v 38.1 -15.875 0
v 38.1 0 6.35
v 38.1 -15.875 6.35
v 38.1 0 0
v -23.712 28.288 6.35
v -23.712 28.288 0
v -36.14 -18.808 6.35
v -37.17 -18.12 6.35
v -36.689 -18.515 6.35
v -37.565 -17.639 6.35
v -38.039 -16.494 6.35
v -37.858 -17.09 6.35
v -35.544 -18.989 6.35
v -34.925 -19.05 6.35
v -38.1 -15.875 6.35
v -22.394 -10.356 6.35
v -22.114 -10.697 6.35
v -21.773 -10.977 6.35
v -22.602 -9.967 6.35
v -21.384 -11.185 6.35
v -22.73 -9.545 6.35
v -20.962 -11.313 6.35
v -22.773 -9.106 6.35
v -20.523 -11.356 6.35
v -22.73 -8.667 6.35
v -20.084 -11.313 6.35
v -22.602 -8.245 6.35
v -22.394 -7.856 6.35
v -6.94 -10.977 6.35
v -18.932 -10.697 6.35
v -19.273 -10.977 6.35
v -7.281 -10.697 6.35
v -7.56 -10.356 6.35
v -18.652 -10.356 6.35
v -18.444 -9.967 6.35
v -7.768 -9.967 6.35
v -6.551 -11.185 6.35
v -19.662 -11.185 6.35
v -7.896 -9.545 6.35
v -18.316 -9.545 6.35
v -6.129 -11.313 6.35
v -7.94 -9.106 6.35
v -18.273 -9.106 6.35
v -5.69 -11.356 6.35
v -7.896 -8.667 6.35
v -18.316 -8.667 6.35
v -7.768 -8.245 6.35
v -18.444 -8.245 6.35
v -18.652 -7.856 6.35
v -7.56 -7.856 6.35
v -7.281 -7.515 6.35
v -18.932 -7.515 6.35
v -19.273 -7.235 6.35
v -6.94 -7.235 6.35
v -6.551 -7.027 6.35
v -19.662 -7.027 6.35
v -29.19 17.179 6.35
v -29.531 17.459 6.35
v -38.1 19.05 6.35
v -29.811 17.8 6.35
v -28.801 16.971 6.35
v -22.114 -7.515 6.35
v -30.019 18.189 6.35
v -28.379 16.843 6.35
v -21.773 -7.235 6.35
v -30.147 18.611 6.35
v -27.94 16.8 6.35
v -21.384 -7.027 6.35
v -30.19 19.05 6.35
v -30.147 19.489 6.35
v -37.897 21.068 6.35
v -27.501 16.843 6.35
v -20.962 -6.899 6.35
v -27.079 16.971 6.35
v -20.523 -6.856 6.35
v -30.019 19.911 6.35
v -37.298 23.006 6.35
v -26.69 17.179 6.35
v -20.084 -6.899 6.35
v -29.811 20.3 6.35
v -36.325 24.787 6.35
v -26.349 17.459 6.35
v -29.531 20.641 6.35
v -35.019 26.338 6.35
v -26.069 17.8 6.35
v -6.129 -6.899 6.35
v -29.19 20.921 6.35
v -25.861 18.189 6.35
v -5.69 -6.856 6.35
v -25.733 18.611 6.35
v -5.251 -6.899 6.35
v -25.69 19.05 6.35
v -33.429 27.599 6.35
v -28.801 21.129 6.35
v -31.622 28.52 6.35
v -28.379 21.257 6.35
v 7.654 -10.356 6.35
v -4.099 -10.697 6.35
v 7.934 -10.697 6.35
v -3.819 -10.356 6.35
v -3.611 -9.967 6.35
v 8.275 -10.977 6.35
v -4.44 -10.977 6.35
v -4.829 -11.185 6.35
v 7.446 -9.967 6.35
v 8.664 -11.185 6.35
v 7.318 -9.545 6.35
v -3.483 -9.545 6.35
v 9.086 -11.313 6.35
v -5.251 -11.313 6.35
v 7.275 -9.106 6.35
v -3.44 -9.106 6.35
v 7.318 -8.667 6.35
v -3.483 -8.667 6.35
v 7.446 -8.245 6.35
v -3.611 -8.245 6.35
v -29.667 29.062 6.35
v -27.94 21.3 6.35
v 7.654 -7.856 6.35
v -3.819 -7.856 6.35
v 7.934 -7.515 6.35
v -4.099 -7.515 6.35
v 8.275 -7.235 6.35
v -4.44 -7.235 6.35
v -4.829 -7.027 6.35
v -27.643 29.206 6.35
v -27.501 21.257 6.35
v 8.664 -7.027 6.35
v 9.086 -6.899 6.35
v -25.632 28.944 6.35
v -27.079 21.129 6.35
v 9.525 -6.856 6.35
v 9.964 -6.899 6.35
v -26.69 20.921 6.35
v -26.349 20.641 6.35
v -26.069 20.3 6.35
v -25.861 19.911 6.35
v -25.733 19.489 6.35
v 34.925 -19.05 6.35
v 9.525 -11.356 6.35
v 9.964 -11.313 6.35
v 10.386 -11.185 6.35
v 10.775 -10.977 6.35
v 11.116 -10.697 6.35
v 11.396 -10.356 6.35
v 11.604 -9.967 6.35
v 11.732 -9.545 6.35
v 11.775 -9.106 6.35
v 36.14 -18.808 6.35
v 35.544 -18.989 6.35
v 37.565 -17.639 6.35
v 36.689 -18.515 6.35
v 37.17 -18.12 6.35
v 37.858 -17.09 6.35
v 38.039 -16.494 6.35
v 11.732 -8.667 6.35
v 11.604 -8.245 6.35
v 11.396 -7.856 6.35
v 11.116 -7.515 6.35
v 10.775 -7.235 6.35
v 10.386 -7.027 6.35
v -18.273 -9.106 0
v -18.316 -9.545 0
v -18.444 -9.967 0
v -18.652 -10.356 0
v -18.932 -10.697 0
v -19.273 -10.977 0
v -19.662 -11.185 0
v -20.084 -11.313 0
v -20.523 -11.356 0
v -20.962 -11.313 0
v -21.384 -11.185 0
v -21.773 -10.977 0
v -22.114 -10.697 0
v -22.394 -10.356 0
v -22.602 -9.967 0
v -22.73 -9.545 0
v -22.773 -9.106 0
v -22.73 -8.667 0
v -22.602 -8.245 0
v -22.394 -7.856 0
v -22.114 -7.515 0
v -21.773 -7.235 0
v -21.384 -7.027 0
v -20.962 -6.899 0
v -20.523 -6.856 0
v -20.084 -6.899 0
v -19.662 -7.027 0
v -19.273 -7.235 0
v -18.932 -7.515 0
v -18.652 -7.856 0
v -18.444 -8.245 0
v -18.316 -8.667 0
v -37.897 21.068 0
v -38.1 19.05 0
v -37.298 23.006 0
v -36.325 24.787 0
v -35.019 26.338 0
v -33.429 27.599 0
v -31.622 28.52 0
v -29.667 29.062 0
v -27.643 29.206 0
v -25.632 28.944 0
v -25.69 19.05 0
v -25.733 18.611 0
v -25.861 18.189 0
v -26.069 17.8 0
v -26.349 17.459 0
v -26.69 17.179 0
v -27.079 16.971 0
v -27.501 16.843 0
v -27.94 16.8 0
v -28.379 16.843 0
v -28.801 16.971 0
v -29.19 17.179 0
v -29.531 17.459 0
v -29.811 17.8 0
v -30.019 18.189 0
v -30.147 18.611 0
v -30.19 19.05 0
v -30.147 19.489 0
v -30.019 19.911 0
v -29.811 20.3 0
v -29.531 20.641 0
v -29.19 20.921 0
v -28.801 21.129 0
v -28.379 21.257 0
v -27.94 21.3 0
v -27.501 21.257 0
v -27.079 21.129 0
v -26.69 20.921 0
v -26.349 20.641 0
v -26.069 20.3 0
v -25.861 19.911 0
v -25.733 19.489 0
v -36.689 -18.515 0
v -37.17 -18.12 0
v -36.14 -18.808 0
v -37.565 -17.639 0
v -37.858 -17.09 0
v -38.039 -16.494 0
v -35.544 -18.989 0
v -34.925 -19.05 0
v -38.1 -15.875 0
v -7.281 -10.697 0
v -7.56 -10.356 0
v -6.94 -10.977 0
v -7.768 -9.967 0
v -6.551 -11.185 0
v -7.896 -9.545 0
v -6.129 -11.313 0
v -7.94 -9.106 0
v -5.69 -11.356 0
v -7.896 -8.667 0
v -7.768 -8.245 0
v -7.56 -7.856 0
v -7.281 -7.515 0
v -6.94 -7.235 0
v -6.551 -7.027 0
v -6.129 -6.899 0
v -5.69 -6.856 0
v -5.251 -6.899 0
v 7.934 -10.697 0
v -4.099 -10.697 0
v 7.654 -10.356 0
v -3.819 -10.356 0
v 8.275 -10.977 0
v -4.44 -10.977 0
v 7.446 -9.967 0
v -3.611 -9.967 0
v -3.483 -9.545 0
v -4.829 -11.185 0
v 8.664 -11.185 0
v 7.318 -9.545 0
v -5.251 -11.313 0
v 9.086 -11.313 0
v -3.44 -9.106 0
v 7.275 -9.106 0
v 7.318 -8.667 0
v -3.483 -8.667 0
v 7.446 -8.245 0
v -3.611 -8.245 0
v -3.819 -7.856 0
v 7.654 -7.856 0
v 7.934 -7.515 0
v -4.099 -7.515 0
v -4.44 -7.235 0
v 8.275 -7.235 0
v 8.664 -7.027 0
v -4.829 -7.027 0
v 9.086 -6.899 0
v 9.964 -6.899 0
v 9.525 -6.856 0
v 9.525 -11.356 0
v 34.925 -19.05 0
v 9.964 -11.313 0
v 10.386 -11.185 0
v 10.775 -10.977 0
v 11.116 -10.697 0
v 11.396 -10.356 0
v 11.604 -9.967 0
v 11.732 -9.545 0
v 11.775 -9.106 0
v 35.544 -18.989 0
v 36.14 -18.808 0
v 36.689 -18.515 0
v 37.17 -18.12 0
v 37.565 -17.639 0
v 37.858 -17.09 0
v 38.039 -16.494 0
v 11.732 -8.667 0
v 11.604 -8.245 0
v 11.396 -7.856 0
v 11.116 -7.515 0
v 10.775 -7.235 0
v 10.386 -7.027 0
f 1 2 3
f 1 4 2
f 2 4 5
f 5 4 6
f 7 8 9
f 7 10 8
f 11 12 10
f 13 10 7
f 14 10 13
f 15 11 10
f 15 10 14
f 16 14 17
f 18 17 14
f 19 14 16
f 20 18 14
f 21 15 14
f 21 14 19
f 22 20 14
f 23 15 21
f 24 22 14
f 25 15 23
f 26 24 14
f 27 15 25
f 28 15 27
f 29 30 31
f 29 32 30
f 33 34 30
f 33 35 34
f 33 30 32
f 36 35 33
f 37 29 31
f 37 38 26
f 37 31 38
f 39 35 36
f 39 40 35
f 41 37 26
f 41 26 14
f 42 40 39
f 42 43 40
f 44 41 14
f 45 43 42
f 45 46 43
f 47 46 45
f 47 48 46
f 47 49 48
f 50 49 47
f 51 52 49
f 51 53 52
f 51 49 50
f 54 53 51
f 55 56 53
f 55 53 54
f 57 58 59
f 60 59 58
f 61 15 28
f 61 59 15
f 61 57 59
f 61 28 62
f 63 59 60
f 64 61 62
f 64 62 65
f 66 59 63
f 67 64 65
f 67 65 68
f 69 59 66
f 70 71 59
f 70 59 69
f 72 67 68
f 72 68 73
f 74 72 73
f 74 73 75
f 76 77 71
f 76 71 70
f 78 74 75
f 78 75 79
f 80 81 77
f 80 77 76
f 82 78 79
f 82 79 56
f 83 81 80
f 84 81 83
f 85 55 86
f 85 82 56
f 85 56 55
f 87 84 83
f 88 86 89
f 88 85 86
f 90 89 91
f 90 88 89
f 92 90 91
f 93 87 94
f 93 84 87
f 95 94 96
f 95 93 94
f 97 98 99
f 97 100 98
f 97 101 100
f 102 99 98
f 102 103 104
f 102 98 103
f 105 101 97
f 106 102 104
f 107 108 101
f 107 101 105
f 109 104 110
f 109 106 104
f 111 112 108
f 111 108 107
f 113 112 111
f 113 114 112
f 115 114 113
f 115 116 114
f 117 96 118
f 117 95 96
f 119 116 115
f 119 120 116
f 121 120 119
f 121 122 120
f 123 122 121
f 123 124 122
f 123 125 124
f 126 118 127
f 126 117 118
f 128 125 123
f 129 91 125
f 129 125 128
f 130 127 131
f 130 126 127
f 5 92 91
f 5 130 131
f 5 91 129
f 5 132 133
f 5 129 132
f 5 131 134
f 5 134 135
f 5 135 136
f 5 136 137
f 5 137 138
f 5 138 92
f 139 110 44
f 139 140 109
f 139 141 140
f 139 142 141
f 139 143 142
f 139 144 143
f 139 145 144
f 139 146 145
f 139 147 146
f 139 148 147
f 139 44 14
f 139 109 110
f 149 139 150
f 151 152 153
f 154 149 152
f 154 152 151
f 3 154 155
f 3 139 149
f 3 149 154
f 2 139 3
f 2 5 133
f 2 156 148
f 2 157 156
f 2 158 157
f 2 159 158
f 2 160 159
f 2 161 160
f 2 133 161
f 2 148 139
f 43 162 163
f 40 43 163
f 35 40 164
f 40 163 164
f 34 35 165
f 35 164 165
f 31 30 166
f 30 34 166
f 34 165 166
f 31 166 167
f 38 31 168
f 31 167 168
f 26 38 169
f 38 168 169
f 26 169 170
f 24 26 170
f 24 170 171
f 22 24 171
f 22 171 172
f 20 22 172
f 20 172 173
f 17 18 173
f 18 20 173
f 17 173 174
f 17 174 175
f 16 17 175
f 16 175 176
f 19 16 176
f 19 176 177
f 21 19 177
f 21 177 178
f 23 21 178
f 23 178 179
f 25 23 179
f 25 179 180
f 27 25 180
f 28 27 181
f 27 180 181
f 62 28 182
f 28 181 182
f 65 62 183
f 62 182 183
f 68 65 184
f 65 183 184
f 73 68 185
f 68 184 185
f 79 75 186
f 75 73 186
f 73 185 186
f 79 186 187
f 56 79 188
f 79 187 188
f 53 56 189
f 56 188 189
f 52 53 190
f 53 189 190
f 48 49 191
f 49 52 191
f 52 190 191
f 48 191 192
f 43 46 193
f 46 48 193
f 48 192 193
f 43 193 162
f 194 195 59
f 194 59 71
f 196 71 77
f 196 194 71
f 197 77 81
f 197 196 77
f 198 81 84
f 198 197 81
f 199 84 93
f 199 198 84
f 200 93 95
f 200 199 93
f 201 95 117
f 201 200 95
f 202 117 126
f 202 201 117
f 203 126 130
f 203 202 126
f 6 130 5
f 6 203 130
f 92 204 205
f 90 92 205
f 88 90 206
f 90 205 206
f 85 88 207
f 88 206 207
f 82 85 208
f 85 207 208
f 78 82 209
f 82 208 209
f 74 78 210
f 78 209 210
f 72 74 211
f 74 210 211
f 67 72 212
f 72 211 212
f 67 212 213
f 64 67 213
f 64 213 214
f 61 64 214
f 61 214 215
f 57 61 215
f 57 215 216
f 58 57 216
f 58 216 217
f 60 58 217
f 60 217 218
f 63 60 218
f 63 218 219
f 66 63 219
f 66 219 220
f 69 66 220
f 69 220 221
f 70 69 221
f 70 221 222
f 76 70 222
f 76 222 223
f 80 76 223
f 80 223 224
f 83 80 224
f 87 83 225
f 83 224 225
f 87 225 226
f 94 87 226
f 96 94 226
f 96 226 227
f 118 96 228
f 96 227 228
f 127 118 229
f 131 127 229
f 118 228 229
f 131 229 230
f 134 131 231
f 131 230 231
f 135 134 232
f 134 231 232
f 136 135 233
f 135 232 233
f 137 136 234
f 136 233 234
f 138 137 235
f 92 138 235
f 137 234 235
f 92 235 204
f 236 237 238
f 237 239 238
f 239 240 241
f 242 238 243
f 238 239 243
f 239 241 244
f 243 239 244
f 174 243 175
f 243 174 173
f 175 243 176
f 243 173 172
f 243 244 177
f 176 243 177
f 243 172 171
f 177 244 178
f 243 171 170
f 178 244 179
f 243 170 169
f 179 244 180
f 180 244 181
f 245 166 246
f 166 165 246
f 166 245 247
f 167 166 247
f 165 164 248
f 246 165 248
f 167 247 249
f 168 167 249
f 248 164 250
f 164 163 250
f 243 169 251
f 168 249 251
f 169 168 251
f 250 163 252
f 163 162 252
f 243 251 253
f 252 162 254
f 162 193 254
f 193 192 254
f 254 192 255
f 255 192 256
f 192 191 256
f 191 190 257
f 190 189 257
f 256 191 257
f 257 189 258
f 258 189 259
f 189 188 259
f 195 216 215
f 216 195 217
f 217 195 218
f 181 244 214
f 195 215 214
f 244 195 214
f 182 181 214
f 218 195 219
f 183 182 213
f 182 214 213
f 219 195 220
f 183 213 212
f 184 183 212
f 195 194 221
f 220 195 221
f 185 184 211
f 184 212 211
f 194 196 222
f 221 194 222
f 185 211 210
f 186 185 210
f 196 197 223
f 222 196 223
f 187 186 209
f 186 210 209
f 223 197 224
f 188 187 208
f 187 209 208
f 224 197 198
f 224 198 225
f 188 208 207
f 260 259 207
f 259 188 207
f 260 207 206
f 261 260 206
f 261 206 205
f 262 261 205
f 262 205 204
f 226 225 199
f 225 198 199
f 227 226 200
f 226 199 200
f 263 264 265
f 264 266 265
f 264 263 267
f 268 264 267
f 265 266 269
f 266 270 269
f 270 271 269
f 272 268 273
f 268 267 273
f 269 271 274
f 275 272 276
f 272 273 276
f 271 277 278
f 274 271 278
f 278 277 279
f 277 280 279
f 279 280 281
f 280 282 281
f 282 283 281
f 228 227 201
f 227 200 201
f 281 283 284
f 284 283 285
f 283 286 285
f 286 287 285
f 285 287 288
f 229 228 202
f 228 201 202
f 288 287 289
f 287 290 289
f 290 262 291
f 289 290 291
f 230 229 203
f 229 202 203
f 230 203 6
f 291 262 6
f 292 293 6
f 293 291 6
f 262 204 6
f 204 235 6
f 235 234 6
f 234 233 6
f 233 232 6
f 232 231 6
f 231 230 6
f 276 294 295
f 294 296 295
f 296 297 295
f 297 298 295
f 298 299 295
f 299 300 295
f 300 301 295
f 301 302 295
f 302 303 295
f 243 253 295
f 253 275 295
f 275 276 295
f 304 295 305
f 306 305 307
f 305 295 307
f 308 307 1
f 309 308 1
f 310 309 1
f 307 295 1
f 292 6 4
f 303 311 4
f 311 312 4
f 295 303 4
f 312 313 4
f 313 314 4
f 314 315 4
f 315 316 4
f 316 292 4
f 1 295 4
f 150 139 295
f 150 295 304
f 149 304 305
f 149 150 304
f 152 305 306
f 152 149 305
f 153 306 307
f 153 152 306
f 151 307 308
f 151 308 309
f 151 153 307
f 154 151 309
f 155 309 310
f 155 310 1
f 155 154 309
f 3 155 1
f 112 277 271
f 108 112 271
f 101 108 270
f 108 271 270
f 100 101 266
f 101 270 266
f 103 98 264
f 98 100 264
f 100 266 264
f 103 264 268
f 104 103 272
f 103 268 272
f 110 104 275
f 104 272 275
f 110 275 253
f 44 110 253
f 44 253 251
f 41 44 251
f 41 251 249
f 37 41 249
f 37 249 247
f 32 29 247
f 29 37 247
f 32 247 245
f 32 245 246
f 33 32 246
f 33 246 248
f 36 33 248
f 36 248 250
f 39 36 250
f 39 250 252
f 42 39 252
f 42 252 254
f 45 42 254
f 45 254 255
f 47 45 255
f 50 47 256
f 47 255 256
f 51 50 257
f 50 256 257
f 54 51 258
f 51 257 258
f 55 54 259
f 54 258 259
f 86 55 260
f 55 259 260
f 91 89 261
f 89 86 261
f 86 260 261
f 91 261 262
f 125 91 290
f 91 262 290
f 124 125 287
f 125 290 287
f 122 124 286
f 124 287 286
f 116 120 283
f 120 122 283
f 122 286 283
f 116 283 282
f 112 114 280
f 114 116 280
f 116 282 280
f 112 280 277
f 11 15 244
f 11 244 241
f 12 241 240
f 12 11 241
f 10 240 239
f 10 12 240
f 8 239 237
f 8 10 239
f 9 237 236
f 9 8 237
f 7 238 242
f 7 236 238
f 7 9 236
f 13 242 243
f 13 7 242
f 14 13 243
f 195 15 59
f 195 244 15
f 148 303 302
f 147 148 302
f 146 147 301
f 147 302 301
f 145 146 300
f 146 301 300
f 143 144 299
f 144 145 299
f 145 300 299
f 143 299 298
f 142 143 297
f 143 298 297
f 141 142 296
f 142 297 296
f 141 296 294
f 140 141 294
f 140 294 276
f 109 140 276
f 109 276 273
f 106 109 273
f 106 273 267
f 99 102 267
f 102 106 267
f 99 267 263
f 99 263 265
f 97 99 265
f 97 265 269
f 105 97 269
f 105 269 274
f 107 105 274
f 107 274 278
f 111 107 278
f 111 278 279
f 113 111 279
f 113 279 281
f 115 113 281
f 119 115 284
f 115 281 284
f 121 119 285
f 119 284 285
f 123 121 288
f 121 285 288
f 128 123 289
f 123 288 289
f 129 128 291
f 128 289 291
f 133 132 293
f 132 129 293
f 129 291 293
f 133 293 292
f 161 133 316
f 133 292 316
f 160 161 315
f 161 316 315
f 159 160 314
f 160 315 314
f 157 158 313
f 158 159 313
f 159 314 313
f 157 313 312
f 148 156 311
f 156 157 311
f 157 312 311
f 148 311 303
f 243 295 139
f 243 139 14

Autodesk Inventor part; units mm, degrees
ref_plane "YZ Plane" through (0, 0, 0) normal (1, 0, 0) x (0, 1, 0)
ref_plane "XZ Plane" through (0, 0, 0) normal (0, 1, 0) x (-1, 0, 0)
ref_plane "XY Plane" through (0, 0, 0) normal (0, 0, 1) x (1, 0, 0)
sketch "Sketch1" plane through (0, 0, 0) normal (0, 0, 1) x (1, 0, 0)
  line L0 (38.1, -19.05) -> (-38.1, -19.05)
  line L1 (-38.1, -19.05) -> (-38.1, 19.05)
  line L2 (-38.1, 19.05) -> (38.1, 19.05)
  line L3 (38.1, 19.05) -> (38.1, -19.05)
  line L4 (38.1, -19.05) -> (-38.1, 19.05) construction
  line L5 (-38.1, -19.05) -> (38.1, 19.05) construction
  line L6 (-38.1, -19.05) -> (38.1, -19.05)
  line L7 (38.1, -19.05) -> (38.1, 0.8382)
  line L8 (38.1, 0.8382) -> (-38.1, 0.8382) construction
  line L9 (-38.1, 0.8382) -> (-38.1, -19.05)
  line L10 (-38.1, -9.1059) -> (38.1, -9.1059) construction
  circle A0 centre (-20.5232, -9.1059) radius 2.25
  circle A1 centre (-5.6896, -9.1059) radius 2.25
  circle A2 centre (9.525, -9.1059) radius 2.25
  circle A3 centre (-27.94, 19.05) radius 6.35 construction
  circle A4 centre (-27.94, 19.05) radius 2.25
  circle A5 centre (-27.94, 19.05) radius 10.16
  line L11 (38.1, 0) -> (-23.712, 28.2885)
  point P0 (0, 0)
  point P1 (-38.1, 19.05)
  point P2 (-17.78, 19.05)
  point P3 (-3.5254, 19.05)
  dimension "d0" = 76.2
  dimension "d1" = 38.1
  dimension "d2" = 19.8882
  dimension "d3" = 4.5
  dimension "d4" = 17.5768
  dimension "d5" = 4.5
  dimension "d6" = 14.8336
  dimension "d7" = 4.5
  dimension "d8" = 15.2146
  dimension "d9" = 12.7
  dimension "d10" = 0
  dimension "d11" = 10.16
  dimension "d12" = 4.5
extrude "Extrusion1" add sketch "Sketch1" along normal blind 6.35 contours L0 L1 A5 L2 L11 L3 | L11 L2 L3 | L2 A5 L11 | A5 L2 A4 | L2 A4 A5
extrude "Extrusion2" cut sketch "Sketch1" along normal blind 6.35 contours L11 L2 L3
fillet "Fillet1" radius 3.175 2 edges at (38.1, -19.05, 3.175) (-38.1, -19.05, 3.175)
properties part number "Slide_Climb_Conforce_Spring_Mount"
